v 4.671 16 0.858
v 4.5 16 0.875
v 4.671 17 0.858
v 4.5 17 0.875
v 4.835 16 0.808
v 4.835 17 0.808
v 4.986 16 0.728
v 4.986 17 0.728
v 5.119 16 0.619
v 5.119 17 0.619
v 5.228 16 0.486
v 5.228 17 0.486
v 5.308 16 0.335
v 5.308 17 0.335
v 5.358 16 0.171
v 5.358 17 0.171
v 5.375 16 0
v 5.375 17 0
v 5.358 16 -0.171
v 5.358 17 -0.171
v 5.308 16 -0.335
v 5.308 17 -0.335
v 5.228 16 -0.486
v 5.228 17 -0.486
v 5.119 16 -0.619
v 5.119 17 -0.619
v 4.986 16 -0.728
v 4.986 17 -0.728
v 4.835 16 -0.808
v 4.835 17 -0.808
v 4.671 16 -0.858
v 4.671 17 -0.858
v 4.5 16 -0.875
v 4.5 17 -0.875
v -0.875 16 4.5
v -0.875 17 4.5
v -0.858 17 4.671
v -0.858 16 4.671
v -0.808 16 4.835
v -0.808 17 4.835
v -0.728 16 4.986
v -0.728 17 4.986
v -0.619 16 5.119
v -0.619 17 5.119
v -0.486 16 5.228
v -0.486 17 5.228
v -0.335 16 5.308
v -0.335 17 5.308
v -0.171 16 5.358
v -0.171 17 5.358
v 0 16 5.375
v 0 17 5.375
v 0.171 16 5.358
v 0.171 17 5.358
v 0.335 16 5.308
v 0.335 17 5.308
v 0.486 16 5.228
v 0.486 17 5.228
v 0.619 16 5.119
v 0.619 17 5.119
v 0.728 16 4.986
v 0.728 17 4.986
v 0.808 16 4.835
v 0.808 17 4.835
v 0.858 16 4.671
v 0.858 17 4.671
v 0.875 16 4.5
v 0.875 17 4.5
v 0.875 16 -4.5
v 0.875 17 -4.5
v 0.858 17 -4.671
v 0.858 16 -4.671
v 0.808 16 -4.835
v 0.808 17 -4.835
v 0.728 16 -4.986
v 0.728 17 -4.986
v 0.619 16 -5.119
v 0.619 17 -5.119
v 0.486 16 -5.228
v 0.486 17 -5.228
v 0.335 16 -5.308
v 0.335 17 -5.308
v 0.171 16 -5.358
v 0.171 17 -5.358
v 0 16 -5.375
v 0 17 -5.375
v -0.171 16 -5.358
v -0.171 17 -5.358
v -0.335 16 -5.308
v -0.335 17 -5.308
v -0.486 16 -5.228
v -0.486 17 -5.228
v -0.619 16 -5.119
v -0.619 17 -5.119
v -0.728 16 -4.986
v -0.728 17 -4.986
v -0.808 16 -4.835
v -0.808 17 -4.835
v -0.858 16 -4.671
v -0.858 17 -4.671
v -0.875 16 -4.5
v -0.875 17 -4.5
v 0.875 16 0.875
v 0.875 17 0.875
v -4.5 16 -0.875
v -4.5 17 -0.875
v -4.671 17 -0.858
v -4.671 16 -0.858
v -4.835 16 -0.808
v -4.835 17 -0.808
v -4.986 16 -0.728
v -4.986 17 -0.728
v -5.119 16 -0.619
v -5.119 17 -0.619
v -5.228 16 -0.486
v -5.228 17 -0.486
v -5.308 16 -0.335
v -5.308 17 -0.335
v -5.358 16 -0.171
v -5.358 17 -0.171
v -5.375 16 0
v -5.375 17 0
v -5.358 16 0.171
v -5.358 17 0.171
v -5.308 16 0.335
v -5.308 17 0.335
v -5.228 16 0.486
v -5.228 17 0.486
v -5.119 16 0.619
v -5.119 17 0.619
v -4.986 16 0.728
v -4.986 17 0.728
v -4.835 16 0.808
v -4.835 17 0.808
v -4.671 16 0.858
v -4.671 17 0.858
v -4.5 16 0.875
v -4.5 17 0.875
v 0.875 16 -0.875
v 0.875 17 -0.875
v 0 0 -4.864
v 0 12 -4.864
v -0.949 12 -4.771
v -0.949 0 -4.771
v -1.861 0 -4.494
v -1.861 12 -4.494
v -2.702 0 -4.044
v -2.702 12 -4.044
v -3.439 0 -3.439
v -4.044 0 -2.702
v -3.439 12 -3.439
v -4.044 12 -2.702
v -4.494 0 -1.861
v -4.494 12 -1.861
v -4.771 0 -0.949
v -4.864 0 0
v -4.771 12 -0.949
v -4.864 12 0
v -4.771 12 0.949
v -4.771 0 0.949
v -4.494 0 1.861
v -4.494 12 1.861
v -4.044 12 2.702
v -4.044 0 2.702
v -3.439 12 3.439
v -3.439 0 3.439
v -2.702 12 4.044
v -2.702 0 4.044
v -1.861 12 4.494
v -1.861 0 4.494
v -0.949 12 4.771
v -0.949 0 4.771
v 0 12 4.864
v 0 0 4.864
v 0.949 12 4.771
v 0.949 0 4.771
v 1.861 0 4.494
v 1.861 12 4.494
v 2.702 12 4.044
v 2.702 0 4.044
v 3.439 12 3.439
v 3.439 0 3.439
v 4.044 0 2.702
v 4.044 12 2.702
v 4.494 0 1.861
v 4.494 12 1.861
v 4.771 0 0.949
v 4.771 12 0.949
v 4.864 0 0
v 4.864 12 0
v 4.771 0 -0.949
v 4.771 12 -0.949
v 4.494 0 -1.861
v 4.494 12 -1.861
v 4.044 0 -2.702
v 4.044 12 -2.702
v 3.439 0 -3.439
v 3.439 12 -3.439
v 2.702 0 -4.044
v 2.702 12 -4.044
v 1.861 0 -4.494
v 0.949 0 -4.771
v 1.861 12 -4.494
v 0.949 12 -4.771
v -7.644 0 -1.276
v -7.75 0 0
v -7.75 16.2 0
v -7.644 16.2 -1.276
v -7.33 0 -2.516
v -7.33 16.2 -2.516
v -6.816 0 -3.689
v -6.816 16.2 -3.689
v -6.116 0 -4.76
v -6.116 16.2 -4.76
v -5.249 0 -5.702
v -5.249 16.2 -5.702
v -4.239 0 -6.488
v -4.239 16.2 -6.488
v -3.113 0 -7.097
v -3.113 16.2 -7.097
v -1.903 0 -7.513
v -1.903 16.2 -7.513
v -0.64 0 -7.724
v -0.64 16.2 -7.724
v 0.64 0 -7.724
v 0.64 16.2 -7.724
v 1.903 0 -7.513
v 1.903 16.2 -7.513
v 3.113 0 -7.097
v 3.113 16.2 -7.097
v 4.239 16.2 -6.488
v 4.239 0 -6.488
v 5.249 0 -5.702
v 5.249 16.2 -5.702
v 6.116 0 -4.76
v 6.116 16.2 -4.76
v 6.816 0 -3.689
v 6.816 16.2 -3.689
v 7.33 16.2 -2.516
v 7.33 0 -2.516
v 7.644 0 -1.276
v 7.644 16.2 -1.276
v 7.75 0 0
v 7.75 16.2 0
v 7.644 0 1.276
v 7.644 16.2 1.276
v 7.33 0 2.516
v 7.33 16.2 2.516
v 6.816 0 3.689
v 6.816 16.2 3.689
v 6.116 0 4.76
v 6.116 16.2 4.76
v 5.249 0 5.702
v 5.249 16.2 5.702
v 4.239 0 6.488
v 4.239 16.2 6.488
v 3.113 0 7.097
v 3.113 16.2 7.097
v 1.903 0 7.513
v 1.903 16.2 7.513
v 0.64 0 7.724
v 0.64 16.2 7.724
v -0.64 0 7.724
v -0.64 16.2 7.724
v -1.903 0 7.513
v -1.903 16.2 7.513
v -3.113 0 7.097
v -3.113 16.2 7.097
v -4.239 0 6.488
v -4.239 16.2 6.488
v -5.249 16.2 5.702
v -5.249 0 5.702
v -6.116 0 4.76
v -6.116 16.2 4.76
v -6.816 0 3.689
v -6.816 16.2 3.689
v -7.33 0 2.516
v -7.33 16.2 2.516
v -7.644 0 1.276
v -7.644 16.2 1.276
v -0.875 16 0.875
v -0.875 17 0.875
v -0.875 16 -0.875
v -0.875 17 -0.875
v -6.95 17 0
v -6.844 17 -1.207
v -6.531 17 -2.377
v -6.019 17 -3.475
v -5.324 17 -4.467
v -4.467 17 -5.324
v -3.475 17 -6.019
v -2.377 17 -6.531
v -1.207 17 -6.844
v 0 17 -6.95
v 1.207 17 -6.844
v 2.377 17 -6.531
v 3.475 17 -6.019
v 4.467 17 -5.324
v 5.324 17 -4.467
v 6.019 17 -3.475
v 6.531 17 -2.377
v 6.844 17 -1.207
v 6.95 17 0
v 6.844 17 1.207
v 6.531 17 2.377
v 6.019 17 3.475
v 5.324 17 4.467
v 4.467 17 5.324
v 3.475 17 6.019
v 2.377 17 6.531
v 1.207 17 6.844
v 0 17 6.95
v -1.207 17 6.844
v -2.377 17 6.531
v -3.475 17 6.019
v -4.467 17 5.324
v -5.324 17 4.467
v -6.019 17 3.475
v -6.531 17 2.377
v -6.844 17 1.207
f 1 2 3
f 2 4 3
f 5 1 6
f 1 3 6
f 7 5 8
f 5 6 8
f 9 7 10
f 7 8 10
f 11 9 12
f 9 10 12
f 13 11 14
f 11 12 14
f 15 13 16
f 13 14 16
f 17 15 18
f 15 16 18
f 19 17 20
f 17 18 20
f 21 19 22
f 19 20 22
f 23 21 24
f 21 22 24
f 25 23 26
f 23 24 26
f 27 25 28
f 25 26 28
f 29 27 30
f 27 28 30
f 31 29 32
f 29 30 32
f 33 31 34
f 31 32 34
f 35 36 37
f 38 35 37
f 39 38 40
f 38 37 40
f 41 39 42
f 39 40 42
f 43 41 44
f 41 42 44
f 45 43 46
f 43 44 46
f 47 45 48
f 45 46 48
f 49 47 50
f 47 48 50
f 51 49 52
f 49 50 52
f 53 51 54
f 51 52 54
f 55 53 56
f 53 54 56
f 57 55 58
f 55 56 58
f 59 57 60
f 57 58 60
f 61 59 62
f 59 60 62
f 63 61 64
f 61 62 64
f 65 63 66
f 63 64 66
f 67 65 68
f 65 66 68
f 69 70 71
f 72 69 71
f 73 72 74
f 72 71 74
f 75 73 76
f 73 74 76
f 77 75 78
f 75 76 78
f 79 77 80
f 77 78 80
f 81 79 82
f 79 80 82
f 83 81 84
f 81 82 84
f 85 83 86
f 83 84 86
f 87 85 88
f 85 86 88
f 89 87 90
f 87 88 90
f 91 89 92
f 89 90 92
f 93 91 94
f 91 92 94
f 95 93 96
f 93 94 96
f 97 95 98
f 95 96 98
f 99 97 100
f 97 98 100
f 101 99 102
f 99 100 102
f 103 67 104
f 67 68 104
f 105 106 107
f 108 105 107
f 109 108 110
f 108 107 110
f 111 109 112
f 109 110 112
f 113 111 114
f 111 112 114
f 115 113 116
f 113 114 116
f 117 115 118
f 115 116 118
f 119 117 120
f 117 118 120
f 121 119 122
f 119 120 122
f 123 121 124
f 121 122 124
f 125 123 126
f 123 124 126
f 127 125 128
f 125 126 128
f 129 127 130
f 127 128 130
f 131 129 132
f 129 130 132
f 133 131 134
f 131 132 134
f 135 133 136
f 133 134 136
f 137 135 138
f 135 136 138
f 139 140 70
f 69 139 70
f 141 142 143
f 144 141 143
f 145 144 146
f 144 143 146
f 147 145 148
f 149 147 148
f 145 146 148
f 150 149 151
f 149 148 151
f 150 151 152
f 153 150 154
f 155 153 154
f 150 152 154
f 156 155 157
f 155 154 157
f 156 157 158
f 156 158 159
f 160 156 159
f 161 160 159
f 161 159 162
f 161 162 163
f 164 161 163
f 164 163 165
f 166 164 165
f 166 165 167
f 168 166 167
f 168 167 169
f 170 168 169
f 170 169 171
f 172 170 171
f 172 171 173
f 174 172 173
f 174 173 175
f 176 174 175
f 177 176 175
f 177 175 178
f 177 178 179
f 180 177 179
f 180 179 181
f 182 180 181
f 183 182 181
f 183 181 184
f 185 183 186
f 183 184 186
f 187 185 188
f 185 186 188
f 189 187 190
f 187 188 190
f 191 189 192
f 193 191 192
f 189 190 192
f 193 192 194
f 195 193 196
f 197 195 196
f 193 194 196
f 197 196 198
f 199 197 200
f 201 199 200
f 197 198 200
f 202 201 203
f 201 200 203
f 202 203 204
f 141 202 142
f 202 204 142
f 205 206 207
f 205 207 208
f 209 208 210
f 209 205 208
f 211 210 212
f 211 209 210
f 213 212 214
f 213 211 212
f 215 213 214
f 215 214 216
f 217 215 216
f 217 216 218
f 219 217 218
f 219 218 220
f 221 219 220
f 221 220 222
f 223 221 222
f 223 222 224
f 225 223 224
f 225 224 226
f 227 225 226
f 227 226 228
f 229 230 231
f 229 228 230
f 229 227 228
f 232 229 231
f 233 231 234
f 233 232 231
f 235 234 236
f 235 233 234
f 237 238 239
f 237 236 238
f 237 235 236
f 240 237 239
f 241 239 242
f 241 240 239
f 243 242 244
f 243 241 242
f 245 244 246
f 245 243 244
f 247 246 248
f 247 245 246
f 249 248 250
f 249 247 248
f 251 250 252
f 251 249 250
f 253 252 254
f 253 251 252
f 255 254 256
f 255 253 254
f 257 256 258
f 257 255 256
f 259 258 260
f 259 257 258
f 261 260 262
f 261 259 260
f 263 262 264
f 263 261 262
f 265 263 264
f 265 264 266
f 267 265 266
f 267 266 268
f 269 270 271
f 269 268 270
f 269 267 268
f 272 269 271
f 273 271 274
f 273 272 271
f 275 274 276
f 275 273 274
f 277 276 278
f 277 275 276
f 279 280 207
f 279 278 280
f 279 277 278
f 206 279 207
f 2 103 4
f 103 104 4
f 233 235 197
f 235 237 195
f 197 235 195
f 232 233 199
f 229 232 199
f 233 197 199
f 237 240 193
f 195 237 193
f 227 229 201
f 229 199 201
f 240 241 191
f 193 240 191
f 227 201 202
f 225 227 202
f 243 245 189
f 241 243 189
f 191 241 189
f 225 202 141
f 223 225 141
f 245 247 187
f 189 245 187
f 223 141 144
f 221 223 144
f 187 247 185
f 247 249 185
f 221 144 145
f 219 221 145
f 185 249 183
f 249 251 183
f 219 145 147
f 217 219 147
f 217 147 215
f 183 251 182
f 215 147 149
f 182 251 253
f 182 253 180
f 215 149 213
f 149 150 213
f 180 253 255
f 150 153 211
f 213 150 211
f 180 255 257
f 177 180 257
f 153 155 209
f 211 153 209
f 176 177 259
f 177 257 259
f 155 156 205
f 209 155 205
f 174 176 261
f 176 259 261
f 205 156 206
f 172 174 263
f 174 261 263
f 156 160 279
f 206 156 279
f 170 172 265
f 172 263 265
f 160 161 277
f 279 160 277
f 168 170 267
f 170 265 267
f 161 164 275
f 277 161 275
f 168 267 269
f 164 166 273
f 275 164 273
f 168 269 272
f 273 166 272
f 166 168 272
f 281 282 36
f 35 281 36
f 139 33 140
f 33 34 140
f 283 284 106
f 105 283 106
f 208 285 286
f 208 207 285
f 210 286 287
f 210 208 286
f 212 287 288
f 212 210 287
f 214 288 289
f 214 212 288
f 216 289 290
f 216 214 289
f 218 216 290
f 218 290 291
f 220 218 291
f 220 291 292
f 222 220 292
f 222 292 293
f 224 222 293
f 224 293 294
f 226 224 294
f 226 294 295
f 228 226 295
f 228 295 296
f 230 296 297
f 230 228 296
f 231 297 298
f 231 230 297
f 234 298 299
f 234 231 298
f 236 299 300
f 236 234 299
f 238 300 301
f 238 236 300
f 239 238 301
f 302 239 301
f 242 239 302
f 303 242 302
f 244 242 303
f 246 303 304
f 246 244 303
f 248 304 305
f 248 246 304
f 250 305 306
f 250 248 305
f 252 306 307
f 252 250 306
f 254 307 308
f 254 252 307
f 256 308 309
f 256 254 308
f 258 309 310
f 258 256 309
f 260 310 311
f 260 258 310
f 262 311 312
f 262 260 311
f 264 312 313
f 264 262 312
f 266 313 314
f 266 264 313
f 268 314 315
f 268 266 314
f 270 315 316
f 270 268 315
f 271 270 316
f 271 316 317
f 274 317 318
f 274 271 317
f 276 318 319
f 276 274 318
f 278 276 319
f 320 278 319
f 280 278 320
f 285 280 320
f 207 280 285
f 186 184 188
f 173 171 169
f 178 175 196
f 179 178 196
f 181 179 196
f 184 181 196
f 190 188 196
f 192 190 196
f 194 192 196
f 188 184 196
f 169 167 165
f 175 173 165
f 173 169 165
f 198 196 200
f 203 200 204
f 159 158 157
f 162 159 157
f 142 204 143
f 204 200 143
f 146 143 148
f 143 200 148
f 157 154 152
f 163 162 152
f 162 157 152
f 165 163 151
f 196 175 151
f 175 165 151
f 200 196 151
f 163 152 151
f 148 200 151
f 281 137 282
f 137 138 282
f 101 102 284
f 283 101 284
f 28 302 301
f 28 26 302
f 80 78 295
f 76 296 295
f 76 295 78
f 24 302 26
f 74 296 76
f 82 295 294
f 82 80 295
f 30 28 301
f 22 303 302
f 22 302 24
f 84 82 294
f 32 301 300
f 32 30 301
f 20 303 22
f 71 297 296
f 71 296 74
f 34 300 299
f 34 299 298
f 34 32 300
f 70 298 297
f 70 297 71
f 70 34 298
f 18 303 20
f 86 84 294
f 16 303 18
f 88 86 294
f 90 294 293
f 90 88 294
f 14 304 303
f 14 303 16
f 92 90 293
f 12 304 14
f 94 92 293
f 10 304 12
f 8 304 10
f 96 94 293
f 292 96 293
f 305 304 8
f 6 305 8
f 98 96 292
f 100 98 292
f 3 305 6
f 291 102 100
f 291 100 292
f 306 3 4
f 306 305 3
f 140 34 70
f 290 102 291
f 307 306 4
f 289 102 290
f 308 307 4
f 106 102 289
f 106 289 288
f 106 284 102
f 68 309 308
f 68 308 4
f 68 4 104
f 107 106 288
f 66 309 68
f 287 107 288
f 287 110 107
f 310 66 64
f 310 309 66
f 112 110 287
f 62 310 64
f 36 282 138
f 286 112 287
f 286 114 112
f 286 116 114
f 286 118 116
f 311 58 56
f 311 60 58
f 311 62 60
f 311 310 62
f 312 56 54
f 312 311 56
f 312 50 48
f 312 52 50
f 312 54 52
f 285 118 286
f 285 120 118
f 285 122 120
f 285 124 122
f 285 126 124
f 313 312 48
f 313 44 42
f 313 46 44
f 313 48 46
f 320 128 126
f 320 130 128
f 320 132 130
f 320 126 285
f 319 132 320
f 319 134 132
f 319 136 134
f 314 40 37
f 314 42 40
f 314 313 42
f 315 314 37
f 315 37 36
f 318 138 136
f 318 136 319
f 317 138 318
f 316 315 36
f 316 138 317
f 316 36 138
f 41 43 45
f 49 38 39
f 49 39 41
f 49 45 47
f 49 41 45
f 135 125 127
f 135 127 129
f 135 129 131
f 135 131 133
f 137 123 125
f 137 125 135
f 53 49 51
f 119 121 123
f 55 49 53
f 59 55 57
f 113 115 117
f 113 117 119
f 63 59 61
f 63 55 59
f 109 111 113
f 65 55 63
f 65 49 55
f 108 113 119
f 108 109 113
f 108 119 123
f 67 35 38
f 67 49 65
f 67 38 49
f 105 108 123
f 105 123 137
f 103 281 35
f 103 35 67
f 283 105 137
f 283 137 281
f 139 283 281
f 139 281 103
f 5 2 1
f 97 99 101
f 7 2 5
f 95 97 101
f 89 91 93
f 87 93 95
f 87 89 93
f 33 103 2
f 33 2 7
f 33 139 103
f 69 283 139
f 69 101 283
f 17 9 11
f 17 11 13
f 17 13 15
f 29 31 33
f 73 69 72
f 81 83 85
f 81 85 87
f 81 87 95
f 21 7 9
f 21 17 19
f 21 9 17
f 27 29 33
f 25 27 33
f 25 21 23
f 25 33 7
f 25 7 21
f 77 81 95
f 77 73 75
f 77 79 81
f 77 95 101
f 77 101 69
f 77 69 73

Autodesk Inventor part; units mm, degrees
ref_plane "YZ Plane" through (0, 0, 0) normal (1, 0, 0) x (0, 1, 0)
ref_plane "XZ Plane" through (0, 0, 0) normal (0, 1, 0) x (-1, 0, 0)
ref_plane "XY Plane" through (0, 0, 0) normal (0, 0, 1) x (1, 0, 0)
sketch "Szkic1" plane through (0, 0, 0) normal (0, 1, 0) x (-1, 0, 0)
  circle A0 centre (0, 0) radius 7.75
  dimension "d0" = 15.5
extrude "Wyciągnięcie proste1" add sketch "Szkic1" along normal blind 17
hole "Otwór1" at (0, 0, 0) direction (0, 1, 0) diameter 9.728 depth 12 thread size "7/16-20 UNF" class "2B" standard "ANSI Unified Screw Threads"
chamfer "Faza1" distance 0.8 angle 45 1 edges at (7.75, 17, 0)
sketch "Szkic2" plane through (0, 17, 0) normal (0, 1, 0) x (1, 0, 0)
  circle A0 centre (0, 0) radius 6.95 projected
  line L0 (-4.5, 0) -> (4.5, 0) construction
  line L1 (-4.5, -0.875) -> (4.5, -0.875)
  line L2 (4.5, 0.875) -> (-4.5, 0.875)
  arc A1 (-4.5, 0.875) -> (-4.5, -0.875) centre (-4.5, 0) ccw
  arc A2 (4.5, -0.875) -> (4.5, 0.875) centre (4.5, 0) ccw
  point P0 (0, 0.875)
  dimension "d15" = 1.75
  dimension "d16" = 9
extrude "Wyciągnięcie proste2" cut sketch "Szkic2" against normal blind 1 contours A1 L2 A2 L1
pattern_circular "Szyk kołowy1" count 4 over 360 about axis through (0, 0, 0) along (0, 1, 0) of "Wyciągnięcie proste2"
properties part number "Filtr HOT 3P -korek" material "Tworzywo sztuczne PBT"
